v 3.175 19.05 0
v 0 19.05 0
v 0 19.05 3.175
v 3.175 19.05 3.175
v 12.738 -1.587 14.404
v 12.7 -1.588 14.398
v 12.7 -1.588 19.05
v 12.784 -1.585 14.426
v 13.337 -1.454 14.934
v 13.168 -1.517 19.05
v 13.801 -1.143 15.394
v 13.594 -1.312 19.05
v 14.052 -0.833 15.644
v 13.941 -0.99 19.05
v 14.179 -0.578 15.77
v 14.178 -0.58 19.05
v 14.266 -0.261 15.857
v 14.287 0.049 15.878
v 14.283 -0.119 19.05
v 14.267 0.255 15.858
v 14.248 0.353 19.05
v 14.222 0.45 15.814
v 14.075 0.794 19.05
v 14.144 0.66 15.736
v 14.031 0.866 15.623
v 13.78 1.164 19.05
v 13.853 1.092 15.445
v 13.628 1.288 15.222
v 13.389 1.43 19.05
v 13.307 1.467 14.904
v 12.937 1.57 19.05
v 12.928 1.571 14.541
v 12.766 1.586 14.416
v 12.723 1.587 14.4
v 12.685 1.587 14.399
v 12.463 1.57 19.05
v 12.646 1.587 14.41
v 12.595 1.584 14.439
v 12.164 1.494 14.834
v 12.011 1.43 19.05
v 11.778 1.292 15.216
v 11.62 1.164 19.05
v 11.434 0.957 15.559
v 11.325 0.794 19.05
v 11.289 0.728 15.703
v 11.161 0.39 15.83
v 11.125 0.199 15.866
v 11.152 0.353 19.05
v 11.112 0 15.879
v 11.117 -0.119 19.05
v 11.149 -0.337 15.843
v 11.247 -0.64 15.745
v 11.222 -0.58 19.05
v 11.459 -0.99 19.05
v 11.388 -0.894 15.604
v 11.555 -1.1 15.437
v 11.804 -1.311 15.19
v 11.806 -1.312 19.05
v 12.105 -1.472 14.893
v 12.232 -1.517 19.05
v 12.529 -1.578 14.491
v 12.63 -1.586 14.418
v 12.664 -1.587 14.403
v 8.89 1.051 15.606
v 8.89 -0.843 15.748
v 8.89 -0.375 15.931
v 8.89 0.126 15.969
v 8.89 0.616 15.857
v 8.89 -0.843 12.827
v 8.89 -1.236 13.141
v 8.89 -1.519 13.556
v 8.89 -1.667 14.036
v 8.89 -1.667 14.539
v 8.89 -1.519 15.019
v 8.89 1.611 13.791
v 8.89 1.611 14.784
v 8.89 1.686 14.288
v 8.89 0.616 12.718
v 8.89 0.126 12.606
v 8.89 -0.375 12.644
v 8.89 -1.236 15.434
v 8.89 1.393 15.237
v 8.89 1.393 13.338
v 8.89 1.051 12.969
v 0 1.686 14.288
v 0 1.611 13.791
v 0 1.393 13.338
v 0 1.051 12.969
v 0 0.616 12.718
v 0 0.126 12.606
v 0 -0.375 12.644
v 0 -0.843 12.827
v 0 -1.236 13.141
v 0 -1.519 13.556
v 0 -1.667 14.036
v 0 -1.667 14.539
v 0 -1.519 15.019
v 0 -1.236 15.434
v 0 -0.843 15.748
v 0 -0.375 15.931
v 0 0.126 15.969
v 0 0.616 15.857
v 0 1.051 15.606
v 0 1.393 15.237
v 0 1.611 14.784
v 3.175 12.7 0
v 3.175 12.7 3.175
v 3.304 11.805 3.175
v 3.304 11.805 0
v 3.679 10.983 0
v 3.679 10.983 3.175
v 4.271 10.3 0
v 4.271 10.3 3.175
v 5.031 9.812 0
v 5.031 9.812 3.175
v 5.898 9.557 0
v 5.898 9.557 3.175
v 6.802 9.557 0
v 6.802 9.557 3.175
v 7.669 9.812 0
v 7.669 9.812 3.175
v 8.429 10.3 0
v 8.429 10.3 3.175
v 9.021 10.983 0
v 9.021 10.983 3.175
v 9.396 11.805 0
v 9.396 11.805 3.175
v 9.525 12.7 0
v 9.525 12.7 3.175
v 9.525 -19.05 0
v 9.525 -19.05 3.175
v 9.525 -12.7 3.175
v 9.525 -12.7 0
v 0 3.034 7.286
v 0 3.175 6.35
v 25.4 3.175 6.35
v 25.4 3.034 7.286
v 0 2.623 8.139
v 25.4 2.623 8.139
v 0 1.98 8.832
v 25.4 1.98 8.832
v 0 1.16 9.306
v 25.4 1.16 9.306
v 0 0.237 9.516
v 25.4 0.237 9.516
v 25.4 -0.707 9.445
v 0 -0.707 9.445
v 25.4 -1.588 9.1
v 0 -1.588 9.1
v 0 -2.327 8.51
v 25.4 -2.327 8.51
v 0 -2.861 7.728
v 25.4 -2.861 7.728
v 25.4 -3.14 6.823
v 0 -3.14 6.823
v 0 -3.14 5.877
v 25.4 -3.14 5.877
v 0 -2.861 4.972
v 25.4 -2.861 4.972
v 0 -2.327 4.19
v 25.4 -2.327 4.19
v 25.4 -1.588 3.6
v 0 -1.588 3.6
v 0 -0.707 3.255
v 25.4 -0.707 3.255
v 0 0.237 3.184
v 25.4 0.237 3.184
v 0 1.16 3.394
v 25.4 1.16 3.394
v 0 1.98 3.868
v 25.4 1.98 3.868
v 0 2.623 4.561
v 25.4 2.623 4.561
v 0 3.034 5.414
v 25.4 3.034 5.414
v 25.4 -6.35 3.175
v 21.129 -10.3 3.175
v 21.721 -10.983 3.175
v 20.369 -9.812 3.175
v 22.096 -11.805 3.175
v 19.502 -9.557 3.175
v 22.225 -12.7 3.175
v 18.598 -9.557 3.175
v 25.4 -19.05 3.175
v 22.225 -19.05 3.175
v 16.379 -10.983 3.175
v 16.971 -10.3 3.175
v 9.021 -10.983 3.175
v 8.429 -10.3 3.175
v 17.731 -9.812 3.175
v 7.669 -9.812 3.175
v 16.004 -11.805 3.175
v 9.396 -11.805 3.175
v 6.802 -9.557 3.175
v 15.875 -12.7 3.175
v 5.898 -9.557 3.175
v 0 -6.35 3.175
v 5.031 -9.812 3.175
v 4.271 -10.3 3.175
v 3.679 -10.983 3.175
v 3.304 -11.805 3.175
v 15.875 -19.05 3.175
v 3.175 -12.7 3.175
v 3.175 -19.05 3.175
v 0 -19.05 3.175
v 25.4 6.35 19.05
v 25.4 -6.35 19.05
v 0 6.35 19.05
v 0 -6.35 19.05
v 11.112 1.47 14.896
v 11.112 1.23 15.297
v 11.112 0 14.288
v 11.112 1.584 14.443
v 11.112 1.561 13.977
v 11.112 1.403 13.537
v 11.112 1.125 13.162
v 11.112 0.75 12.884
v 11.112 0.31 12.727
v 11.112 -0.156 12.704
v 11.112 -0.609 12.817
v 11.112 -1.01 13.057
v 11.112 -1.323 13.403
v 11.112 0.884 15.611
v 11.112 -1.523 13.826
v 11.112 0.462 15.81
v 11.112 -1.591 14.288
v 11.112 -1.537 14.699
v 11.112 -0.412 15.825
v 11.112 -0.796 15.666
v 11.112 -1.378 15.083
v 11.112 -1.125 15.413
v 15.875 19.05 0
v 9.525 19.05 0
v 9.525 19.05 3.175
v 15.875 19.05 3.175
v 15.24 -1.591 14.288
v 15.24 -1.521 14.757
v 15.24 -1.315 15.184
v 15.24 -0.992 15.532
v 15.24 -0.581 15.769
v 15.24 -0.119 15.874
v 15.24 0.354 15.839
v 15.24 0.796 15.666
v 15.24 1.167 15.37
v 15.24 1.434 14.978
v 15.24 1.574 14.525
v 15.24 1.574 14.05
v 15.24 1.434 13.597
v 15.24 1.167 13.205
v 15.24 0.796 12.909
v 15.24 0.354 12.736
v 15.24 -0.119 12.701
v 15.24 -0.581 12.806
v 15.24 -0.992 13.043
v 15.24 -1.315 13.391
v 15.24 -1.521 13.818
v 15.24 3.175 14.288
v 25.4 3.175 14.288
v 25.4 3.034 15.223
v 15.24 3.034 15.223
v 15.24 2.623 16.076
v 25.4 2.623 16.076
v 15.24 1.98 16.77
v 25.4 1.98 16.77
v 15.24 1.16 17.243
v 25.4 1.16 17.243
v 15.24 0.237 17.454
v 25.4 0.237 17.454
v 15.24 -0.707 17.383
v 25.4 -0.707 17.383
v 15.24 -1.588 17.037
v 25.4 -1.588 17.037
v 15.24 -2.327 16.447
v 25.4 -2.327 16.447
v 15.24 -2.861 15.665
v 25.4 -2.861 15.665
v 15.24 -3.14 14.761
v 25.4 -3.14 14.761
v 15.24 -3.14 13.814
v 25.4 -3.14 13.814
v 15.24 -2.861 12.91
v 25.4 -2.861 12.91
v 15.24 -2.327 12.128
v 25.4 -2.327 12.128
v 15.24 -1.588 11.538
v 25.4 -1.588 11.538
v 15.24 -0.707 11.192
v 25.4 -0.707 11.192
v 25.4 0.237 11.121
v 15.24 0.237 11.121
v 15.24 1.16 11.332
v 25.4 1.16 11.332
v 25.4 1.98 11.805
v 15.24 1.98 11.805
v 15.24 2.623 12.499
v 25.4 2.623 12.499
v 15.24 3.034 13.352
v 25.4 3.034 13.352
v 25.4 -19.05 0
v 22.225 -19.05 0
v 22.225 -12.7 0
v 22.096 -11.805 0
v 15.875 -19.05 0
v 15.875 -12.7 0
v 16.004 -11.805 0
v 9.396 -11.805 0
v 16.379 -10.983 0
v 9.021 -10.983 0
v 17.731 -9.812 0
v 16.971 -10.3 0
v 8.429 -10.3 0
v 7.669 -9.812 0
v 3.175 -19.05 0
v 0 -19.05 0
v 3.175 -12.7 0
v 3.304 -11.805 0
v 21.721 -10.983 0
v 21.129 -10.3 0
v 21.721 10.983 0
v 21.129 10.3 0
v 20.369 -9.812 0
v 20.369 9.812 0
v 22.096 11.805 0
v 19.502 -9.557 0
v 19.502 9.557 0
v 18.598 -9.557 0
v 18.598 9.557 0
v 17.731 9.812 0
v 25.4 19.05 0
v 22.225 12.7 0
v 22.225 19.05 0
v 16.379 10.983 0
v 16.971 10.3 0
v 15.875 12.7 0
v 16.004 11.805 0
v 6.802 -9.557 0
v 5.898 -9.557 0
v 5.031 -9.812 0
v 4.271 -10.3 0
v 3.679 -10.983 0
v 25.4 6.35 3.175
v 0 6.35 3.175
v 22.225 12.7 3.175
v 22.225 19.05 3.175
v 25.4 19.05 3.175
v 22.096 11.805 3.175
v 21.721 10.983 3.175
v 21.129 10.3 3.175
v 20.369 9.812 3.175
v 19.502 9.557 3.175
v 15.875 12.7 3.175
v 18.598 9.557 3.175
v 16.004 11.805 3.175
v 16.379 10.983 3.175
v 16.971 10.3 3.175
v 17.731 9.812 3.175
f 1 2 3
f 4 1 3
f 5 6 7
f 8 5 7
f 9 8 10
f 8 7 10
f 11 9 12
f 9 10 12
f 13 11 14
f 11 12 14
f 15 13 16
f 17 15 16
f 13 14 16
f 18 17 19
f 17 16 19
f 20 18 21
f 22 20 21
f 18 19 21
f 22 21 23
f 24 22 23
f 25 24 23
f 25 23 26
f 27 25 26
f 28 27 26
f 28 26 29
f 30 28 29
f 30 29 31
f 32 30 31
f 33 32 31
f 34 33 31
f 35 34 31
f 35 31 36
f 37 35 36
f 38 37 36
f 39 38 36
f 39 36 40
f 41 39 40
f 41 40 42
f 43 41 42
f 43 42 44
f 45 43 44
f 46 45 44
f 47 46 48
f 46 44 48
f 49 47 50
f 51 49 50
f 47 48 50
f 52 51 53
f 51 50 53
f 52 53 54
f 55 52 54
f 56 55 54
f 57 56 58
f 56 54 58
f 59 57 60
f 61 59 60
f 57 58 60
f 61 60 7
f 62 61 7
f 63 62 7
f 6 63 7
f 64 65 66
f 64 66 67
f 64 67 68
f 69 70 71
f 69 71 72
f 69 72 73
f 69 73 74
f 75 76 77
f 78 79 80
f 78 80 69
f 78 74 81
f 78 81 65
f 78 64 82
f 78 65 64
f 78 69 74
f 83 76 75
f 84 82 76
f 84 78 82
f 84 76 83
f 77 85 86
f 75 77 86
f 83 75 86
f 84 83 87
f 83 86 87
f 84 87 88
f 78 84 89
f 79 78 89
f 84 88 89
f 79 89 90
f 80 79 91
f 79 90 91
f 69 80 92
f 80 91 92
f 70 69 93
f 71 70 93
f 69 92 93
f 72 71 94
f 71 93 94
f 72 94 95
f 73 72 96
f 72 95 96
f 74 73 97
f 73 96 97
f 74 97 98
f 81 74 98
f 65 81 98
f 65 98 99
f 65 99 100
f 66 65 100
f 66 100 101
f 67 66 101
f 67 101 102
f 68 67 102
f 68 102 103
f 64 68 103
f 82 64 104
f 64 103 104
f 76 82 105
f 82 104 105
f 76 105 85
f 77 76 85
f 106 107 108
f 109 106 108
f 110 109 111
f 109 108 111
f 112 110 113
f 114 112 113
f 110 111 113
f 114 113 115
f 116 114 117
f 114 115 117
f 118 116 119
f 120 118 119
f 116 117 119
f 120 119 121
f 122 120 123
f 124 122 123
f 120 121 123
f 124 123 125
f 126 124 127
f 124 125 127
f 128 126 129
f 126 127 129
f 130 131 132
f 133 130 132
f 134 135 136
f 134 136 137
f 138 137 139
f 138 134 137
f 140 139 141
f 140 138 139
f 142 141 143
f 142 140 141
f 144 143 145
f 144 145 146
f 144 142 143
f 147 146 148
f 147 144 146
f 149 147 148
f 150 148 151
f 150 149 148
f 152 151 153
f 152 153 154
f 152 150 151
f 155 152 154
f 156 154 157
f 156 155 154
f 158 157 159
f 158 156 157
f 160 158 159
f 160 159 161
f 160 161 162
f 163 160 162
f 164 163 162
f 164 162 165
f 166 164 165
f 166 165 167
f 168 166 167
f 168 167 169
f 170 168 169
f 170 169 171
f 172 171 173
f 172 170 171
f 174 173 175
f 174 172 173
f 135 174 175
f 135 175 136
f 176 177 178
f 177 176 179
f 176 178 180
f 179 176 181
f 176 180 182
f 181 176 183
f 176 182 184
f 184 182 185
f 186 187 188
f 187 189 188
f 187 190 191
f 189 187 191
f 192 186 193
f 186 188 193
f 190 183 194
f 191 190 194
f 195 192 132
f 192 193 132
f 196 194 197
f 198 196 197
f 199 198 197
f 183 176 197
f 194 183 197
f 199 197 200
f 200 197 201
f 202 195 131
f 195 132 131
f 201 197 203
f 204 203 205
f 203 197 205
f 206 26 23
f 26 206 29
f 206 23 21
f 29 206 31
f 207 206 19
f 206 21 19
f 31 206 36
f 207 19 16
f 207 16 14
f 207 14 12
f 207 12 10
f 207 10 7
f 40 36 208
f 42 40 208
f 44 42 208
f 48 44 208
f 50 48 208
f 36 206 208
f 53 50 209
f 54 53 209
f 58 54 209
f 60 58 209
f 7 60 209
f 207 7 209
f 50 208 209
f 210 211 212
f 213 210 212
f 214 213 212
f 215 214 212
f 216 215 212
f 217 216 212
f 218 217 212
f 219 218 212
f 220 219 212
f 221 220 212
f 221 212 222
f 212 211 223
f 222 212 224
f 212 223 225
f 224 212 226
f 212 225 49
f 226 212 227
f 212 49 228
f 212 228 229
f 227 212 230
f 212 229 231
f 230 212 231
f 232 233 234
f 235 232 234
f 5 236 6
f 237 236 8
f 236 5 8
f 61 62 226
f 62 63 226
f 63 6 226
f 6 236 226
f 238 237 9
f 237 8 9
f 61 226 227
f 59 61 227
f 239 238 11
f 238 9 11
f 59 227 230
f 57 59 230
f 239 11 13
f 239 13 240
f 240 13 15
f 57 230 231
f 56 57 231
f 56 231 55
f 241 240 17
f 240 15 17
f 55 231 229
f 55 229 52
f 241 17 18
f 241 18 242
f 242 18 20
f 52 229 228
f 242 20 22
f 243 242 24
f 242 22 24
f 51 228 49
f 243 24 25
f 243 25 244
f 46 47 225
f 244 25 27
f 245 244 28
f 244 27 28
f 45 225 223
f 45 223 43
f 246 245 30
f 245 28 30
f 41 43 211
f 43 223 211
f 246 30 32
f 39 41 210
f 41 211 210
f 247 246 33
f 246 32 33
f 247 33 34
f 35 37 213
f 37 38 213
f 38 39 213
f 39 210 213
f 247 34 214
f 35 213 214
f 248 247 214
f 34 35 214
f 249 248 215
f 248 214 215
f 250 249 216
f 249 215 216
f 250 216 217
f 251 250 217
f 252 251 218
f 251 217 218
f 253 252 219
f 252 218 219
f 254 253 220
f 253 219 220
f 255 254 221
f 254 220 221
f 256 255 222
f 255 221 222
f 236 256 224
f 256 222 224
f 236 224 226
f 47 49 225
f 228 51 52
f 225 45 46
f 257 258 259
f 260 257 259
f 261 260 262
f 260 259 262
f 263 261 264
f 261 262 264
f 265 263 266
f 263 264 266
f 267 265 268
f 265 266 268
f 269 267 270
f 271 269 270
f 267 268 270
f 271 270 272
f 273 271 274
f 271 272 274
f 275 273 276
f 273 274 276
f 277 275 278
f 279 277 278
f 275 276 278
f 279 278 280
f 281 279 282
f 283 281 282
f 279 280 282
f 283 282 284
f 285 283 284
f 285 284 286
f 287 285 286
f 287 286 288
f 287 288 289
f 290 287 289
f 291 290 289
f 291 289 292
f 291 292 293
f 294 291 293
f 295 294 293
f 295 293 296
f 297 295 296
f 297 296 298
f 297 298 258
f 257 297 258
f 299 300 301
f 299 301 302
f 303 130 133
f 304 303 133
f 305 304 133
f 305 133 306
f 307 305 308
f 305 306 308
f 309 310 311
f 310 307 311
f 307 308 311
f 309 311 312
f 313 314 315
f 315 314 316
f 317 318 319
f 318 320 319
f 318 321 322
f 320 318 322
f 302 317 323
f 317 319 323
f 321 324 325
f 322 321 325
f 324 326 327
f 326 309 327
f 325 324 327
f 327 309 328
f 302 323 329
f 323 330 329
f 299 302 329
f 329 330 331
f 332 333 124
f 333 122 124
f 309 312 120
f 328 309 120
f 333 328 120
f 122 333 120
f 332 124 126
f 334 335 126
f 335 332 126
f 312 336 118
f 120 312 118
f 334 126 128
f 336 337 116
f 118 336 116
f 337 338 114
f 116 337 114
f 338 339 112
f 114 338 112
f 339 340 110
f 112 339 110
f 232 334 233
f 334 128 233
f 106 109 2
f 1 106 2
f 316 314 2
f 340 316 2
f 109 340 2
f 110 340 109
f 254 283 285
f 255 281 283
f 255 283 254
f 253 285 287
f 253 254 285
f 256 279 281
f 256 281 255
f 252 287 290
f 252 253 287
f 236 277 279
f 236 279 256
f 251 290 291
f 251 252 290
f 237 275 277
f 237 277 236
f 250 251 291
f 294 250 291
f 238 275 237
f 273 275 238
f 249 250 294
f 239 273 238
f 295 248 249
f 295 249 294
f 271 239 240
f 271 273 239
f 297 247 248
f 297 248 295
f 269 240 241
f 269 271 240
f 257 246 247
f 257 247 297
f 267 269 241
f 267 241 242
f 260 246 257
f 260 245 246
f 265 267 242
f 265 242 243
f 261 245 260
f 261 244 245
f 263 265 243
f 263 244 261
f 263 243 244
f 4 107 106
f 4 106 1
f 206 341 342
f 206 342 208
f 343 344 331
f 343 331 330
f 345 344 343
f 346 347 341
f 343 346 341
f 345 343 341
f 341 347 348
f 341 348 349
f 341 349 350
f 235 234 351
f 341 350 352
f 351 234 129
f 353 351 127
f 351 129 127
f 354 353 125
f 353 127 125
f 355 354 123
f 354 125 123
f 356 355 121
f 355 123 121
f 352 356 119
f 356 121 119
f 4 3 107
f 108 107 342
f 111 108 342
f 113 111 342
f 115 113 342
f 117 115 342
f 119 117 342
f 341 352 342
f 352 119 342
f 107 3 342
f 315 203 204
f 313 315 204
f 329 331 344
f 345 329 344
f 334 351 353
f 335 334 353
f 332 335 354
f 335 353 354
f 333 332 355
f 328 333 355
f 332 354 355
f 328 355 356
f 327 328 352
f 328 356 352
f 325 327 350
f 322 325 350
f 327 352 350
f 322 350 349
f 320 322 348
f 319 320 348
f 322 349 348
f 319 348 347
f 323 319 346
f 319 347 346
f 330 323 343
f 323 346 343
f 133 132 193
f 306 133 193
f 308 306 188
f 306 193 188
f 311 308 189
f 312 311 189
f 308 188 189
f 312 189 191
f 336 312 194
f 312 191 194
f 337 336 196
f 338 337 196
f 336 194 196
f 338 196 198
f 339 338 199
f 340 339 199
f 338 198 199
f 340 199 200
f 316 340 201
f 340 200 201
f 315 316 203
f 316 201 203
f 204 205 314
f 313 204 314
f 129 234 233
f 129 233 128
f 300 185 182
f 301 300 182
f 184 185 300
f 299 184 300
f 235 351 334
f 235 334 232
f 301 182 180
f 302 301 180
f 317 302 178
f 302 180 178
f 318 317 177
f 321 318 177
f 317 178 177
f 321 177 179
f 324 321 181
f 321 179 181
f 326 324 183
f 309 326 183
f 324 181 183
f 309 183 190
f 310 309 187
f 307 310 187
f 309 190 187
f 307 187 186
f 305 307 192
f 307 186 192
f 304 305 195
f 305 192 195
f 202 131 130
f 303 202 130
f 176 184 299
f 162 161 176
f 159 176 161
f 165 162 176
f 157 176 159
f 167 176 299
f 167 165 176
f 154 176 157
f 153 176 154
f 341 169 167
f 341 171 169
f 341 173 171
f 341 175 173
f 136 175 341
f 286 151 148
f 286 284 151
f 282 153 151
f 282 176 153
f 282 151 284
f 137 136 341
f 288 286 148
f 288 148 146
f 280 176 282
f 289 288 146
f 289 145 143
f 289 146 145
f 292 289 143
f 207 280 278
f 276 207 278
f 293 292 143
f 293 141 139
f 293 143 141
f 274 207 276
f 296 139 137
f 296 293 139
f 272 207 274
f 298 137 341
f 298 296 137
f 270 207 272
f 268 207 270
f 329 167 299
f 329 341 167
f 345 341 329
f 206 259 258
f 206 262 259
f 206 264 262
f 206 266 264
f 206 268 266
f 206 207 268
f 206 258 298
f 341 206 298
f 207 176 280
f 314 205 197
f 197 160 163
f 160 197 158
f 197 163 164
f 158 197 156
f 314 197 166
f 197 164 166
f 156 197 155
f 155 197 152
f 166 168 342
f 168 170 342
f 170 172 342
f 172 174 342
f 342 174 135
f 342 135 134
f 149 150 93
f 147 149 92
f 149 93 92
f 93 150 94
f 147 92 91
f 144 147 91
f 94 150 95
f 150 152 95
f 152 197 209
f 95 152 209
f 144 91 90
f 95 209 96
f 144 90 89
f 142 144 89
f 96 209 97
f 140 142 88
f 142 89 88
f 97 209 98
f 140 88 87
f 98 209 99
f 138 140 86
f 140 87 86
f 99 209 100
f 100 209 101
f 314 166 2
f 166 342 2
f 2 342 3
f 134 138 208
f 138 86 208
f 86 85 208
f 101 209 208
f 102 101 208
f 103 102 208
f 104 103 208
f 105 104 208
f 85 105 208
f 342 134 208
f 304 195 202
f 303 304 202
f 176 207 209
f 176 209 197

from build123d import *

# Parameters (mm, degrees)
SKETCH_R         = 3.175
PAD_DEPTH        = 25.4
SKETCH001_R      = 1.5875
POCKET_DEPTH     = 4.7625
HOLE_D           = 3.18262
HOLE_DEPTH       = 14.2875
HOLE_CBORE_D     = 6.35
HOLE_CBORE_DEPTH = 10.16
POCKET001_DEPTH  = 5
SKETCH004_R      = 1.6859
HOLE001_DEPTH    = 8.89


with BuildPart() as part:
    # Sketch → Pad (new body)
    with BuildSketch(Plane.YZ):
        Polygon((-19.05, 0), (19.05, 0), (19.05, 3.175), (6.35, 3.175), (6.35, 19.05), (-6.35, 19.05), (-6.35, 3.175), (-19.05, 3.175), align=None)
        with Locations((0, 6.35)):
            Circle(SKETCH_R, mode=Mode.SUBTRACT)
    extrude(amount=PAD_DEPTH)

    # Sketch001 (on Face5 of Pad) → Pocket (cut)
    with BuildSketch(Plane(origin=(0, 0, 19.05), x_dir=(0, -1, 0), z_dir=(0, 0, 1))):
        with Locations((0, 12.7)):
            Circle(SKETCH001_R)
    extrude(amount=-POCKET_DEPTH, mode=Mode.SUBTRACT)

    # Hole
    with Locations(Plane.YZ.offset(25.4)):
        with Locations((0, 14.2875)):
            CounterBoreHole(HOLE_D / 2, HOLE_CBORE_D / 2, HOLE_CBORE_DEPTH, depth=HOLE_DEPTH)

    # Sketch003 (on Face7 of Hole) → Pocket001 (cut)
    with BuildSketch(Plane(origin=(0, 0, 3.175), x_dir=(0, -1, 0), z_dir=(0, 0, 1))):
        with BuildLine():
            Line((25.4, 9.525), (12.7, 9.525))
            ThreePointArc((12.7, 9.525), (9.525, 6.35), (12.7, 3.175))
            Line((12.7, 3.175), (25.4, 3.175))
            Line((25.4, 3.175), (25.4, 9.525))
        make_face()
        with BuildLine():
            Line((25.4, 22.225), (12.7, 22.225))
            ThreePointArc((12.7, 22.225), (9.525, 19.05), (12.7, 15.875))
            Line((12.7, 15.875), (25.4, 15.875))
            Line((25.4, 15.875), (25.4, 22.225))
        make_face()
        with BuildLine():
            Line((-25.4, 22.225), (-12.7, 22.225))
            ThreePointArc((-12.7, 15.875), (-9.525, 19.05), (-12.7, 22.225))
            Line((-12.7, 15.875), (-25.4, 15.875))
            Line((-25.4, 15.875), (-25.4, 22.225))
        make_face()
        with BuildLine():
            Line((-25.4, 9.525), (-12.7, 9.525))
            ThreePointArc((-12.7, 3.175), (-9.525, 6.35), (-12.7, 9.525))
            Line((-12.7, 3.175), (-25.4, 3.175))
            Line((-25.4, 3.175), (-25.4, 9.525))
        make_face()
    extrude(amount=-POCKET001_DEPTH, mode=Mode.SUBTRACT)

    # Sketch004 (on Face2 of Pocket001) → Hole001 (cut)
    with BuildSketch(Plane(origin=(0, 0, 0), x_dir=(0, 1, 0), z_dir=(-1, 0, 0))):
        with Locations((0, -14.2875)):
            Circle(SKETCH004_R)
    extrude(amount=-HOLE001_DEPTH, mode=Mode.SUBTRACT)


solid = part.part
